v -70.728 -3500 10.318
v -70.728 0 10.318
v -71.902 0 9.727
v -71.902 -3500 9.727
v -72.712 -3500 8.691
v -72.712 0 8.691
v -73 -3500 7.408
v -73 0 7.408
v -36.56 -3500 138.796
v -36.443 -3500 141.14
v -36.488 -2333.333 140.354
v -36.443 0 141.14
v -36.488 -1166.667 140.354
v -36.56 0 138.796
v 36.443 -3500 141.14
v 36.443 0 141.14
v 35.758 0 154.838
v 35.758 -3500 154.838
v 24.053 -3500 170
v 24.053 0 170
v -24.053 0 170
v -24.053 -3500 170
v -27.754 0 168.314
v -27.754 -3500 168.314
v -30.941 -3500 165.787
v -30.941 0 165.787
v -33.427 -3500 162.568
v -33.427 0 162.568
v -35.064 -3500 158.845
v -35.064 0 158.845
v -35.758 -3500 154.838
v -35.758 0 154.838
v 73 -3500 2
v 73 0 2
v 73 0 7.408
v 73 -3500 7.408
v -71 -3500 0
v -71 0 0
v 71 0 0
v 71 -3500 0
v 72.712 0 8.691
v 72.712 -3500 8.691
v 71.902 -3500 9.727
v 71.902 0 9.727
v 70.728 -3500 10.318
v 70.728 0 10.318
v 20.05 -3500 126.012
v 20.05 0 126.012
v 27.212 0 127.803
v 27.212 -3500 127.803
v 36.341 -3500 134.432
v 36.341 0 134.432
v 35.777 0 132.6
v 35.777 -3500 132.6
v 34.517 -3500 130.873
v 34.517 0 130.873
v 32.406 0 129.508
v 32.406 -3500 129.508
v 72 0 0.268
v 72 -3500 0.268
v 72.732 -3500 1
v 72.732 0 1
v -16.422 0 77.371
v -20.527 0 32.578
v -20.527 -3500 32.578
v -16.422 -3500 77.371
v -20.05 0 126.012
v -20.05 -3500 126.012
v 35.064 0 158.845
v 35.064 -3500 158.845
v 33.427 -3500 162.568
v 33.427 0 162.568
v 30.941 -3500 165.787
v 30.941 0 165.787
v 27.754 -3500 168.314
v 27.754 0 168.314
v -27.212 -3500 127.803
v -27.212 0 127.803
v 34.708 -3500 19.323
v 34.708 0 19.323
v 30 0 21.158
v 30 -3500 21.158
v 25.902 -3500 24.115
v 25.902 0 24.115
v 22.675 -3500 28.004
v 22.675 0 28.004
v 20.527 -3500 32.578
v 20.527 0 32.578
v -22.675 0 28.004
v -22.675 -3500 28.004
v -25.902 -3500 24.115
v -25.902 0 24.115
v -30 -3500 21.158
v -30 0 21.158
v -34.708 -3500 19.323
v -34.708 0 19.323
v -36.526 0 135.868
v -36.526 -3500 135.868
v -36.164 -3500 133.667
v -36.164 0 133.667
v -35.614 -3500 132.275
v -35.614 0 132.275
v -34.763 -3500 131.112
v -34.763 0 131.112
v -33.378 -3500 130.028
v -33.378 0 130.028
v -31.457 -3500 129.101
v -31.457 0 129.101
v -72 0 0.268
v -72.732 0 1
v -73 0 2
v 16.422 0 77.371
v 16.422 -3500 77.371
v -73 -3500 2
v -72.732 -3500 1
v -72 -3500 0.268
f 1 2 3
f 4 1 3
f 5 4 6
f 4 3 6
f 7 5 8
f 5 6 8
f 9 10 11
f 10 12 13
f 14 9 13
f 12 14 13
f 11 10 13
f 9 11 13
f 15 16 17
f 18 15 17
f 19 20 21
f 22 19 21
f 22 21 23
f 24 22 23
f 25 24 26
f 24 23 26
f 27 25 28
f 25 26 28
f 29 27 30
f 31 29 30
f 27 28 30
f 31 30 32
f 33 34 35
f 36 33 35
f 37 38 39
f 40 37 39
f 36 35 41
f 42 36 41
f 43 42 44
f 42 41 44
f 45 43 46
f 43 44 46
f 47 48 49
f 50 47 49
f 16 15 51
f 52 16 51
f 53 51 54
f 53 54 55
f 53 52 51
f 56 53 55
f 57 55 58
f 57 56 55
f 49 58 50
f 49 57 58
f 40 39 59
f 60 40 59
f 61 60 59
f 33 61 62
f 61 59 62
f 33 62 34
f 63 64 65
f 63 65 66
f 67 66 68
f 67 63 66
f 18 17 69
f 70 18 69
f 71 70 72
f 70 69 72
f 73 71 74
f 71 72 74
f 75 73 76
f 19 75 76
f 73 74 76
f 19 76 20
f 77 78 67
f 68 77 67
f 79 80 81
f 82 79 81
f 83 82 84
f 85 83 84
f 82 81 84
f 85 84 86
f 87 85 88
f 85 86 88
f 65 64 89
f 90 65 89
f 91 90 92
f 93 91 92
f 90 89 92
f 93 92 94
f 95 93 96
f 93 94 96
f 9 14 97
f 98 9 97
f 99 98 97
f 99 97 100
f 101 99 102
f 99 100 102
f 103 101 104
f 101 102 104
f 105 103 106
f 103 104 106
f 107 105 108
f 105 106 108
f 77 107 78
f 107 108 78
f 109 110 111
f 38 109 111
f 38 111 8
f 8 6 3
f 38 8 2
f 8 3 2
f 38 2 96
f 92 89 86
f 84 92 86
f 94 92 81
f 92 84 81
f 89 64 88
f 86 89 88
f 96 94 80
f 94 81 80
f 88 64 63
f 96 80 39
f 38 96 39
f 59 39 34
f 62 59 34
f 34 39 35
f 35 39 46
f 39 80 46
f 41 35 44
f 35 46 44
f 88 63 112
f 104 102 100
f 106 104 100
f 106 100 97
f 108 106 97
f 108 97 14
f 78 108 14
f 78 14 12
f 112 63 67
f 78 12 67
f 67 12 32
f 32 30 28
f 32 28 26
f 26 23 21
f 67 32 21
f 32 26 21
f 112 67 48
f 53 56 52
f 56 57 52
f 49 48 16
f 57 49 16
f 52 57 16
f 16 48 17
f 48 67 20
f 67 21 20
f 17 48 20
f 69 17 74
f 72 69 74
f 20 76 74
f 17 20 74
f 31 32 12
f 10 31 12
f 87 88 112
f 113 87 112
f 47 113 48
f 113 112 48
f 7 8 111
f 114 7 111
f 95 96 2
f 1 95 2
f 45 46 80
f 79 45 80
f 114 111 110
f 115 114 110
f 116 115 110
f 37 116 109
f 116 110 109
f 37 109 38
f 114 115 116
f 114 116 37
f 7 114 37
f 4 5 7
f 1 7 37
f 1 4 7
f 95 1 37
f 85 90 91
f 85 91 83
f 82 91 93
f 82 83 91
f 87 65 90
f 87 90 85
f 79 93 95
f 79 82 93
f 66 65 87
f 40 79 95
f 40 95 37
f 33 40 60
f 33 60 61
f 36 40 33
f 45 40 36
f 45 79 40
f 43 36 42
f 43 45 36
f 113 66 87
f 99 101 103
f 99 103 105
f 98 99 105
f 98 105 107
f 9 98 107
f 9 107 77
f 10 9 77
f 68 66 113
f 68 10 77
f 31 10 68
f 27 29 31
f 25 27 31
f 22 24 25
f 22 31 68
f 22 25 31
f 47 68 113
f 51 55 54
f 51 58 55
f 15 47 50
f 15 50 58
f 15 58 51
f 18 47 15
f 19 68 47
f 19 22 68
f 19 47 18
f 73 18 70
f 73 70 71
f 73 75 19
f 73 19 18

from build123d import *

# Parameters (mm, degrees)
F1_DEPTH = 3500


with BuildPart() as f1:
    # F0 (on Front) → F1 (new body)
    with BuildSketch(Plane.XZ):
        with BuildLine():
            Line((-71, 0), (0, 0))
            Line((0, 0), (71, 0))
            ThreePointArc((71, 0), (72.4142135624, 0.5857864376), (73, 2))
            Line((73, 2), (73, 7.4076707781))
            ThreePointArc((73, 7.4076707781), (72.3646163141, 9.2539074062), (70.7276068752, 10.3180982785))
            Line((70.7276068752, 10.3180982785), (34.7080603465, 19.3229849121))
            ThreePointArc((34.7080603465, 19.3229849121), (25.9016301936, 24.1147961248), (20.5270578969, 32.5781665742))
            add(Edge.make_bspline(
                [(20.5270578969, 32.5781665742), (19.1234273691, 44.047632119), (16.204172, 65.0719813904), (16.4163288517, 88.0919940772), (17.6881490255, 109.03908444), (19.5297670113, 122.9158896084), (19.9703647657, 125.2703977423), (20.0495659832, 126.0123914966)],
                knots=[0, 0, 0, 0, 0.2805439173, 0.5147626715, 0.7415495831, 0.919417208, 1, 1, 1, 1], degree=3))
            Line((20.0495659832, 126.0123914966), (27.2119990374, 127.8029997604))
            add(Edge.make_bspline(
                [(36.4430121564, 141.1397568714), (36.6506904611, 137.5374455317), (37.0598038422, 130.4411155906), (30.4610340463, 128.6733795922), (27.2119990374, 127.8029997604)],
                knots=[0, 0, 0, 0, 0.5076301933, 1, 1, 1, 1], degree=3))
            Line((36.4430121564, 141.1397568714), (35.7581047381, 154.8379052369))
            ThreePointArc((35.7581047381, 154.8379052369), (32.2818284687, 164.2532527584), (24.0533315347, 170))
            Line((24.0533315347, 170), (0, 170))
            Line((0, 170), (-19, 170))
            Line((-19, 170), (-24.0533315347, 170))
            ThreePointArc((-24.0533315347, 170), (-32.2818284687, 164.2532527584), (-35.7581047381, 154.8379052369))
            Line((-35.7581047381, 154.8379052369), (-36.4430121564, 141.1397568714))
            Line((-36.4430121564, 141.1397568714), (-36.5601873215, 138.7962535697))
            add(Edge.make_bspline(
                [(-36.5601873215, 138.7962535697), (-36.655353203, 136.0309623446), (-36.3289879031, 130.2453382437), (-30.4610340463, 128.6733795922), (-27.2119990374, 127.8029997604)],
                knots=[0.110750331, 0.110750331, 0.110750331, 0.110750331, 0.5076301933, 1, 1, 1, 1], degree=3))
            Line((-27.2119990374, 127.8029997604), (-20.0495659832, 126.0123914966))
            add(Edge.make_bspline(
                [(-20.5270578969, 32.5781665742), (-19.1234273691, 44.047632119), (-16.204172, 65.0719813904), (-16.4163288517, 88.0919940772), (-17.6881490255, 109.03908444), (-19.5297670113, 122.9158896084), (-19.9703647657, 125.2703977423), (-20.0495659832, 126.0123914966)],
                knots=[0, 0, 0, 0, 0.2805439173, 0.5147626715, 0.7415495831, 0.919417208, 1, 1, 1, 1], degree=3))
            ThreePointArc((-20.5270578969, 32.5781665742), (-25.9016301936, 24.1147961248), (-34.7080603465, 19.3229849121))
            Line((-34.7080603465, 19.3229849121), (-70.7276068752, 10.3180982785))
            ThreePointArc((-70.7276068752, 10.3180982785), (-72.3646163141, 9.2539074062), (-73, 7.4076707781))
            Line((-73, 7.4076707781), (-73, 2))
            ThreePointArc((-73, 2), (-72.4142135624, 0.5857864376), (-71, 0))
        make_face()
        with BuildLine():
            add(Edge.make_bspline(
                [(-36.4430121564, 141.1397568714), (-36.4883215988, 140.3538359815), (-36.5336310411, 139.5679150916), (-36.5601873215, 138.7962535697)],
                knots=[0, 0, 0, 0, 0.110750331, 0.110750331, 0.110750331, 0.110750331], degree=3))
            Line((-36.5601873215, 138.7962535697), (-36.4430121564, 141.1397568714))
        make_face()
    extrude(amount=F1_DEPTH)


solid = f1.part
